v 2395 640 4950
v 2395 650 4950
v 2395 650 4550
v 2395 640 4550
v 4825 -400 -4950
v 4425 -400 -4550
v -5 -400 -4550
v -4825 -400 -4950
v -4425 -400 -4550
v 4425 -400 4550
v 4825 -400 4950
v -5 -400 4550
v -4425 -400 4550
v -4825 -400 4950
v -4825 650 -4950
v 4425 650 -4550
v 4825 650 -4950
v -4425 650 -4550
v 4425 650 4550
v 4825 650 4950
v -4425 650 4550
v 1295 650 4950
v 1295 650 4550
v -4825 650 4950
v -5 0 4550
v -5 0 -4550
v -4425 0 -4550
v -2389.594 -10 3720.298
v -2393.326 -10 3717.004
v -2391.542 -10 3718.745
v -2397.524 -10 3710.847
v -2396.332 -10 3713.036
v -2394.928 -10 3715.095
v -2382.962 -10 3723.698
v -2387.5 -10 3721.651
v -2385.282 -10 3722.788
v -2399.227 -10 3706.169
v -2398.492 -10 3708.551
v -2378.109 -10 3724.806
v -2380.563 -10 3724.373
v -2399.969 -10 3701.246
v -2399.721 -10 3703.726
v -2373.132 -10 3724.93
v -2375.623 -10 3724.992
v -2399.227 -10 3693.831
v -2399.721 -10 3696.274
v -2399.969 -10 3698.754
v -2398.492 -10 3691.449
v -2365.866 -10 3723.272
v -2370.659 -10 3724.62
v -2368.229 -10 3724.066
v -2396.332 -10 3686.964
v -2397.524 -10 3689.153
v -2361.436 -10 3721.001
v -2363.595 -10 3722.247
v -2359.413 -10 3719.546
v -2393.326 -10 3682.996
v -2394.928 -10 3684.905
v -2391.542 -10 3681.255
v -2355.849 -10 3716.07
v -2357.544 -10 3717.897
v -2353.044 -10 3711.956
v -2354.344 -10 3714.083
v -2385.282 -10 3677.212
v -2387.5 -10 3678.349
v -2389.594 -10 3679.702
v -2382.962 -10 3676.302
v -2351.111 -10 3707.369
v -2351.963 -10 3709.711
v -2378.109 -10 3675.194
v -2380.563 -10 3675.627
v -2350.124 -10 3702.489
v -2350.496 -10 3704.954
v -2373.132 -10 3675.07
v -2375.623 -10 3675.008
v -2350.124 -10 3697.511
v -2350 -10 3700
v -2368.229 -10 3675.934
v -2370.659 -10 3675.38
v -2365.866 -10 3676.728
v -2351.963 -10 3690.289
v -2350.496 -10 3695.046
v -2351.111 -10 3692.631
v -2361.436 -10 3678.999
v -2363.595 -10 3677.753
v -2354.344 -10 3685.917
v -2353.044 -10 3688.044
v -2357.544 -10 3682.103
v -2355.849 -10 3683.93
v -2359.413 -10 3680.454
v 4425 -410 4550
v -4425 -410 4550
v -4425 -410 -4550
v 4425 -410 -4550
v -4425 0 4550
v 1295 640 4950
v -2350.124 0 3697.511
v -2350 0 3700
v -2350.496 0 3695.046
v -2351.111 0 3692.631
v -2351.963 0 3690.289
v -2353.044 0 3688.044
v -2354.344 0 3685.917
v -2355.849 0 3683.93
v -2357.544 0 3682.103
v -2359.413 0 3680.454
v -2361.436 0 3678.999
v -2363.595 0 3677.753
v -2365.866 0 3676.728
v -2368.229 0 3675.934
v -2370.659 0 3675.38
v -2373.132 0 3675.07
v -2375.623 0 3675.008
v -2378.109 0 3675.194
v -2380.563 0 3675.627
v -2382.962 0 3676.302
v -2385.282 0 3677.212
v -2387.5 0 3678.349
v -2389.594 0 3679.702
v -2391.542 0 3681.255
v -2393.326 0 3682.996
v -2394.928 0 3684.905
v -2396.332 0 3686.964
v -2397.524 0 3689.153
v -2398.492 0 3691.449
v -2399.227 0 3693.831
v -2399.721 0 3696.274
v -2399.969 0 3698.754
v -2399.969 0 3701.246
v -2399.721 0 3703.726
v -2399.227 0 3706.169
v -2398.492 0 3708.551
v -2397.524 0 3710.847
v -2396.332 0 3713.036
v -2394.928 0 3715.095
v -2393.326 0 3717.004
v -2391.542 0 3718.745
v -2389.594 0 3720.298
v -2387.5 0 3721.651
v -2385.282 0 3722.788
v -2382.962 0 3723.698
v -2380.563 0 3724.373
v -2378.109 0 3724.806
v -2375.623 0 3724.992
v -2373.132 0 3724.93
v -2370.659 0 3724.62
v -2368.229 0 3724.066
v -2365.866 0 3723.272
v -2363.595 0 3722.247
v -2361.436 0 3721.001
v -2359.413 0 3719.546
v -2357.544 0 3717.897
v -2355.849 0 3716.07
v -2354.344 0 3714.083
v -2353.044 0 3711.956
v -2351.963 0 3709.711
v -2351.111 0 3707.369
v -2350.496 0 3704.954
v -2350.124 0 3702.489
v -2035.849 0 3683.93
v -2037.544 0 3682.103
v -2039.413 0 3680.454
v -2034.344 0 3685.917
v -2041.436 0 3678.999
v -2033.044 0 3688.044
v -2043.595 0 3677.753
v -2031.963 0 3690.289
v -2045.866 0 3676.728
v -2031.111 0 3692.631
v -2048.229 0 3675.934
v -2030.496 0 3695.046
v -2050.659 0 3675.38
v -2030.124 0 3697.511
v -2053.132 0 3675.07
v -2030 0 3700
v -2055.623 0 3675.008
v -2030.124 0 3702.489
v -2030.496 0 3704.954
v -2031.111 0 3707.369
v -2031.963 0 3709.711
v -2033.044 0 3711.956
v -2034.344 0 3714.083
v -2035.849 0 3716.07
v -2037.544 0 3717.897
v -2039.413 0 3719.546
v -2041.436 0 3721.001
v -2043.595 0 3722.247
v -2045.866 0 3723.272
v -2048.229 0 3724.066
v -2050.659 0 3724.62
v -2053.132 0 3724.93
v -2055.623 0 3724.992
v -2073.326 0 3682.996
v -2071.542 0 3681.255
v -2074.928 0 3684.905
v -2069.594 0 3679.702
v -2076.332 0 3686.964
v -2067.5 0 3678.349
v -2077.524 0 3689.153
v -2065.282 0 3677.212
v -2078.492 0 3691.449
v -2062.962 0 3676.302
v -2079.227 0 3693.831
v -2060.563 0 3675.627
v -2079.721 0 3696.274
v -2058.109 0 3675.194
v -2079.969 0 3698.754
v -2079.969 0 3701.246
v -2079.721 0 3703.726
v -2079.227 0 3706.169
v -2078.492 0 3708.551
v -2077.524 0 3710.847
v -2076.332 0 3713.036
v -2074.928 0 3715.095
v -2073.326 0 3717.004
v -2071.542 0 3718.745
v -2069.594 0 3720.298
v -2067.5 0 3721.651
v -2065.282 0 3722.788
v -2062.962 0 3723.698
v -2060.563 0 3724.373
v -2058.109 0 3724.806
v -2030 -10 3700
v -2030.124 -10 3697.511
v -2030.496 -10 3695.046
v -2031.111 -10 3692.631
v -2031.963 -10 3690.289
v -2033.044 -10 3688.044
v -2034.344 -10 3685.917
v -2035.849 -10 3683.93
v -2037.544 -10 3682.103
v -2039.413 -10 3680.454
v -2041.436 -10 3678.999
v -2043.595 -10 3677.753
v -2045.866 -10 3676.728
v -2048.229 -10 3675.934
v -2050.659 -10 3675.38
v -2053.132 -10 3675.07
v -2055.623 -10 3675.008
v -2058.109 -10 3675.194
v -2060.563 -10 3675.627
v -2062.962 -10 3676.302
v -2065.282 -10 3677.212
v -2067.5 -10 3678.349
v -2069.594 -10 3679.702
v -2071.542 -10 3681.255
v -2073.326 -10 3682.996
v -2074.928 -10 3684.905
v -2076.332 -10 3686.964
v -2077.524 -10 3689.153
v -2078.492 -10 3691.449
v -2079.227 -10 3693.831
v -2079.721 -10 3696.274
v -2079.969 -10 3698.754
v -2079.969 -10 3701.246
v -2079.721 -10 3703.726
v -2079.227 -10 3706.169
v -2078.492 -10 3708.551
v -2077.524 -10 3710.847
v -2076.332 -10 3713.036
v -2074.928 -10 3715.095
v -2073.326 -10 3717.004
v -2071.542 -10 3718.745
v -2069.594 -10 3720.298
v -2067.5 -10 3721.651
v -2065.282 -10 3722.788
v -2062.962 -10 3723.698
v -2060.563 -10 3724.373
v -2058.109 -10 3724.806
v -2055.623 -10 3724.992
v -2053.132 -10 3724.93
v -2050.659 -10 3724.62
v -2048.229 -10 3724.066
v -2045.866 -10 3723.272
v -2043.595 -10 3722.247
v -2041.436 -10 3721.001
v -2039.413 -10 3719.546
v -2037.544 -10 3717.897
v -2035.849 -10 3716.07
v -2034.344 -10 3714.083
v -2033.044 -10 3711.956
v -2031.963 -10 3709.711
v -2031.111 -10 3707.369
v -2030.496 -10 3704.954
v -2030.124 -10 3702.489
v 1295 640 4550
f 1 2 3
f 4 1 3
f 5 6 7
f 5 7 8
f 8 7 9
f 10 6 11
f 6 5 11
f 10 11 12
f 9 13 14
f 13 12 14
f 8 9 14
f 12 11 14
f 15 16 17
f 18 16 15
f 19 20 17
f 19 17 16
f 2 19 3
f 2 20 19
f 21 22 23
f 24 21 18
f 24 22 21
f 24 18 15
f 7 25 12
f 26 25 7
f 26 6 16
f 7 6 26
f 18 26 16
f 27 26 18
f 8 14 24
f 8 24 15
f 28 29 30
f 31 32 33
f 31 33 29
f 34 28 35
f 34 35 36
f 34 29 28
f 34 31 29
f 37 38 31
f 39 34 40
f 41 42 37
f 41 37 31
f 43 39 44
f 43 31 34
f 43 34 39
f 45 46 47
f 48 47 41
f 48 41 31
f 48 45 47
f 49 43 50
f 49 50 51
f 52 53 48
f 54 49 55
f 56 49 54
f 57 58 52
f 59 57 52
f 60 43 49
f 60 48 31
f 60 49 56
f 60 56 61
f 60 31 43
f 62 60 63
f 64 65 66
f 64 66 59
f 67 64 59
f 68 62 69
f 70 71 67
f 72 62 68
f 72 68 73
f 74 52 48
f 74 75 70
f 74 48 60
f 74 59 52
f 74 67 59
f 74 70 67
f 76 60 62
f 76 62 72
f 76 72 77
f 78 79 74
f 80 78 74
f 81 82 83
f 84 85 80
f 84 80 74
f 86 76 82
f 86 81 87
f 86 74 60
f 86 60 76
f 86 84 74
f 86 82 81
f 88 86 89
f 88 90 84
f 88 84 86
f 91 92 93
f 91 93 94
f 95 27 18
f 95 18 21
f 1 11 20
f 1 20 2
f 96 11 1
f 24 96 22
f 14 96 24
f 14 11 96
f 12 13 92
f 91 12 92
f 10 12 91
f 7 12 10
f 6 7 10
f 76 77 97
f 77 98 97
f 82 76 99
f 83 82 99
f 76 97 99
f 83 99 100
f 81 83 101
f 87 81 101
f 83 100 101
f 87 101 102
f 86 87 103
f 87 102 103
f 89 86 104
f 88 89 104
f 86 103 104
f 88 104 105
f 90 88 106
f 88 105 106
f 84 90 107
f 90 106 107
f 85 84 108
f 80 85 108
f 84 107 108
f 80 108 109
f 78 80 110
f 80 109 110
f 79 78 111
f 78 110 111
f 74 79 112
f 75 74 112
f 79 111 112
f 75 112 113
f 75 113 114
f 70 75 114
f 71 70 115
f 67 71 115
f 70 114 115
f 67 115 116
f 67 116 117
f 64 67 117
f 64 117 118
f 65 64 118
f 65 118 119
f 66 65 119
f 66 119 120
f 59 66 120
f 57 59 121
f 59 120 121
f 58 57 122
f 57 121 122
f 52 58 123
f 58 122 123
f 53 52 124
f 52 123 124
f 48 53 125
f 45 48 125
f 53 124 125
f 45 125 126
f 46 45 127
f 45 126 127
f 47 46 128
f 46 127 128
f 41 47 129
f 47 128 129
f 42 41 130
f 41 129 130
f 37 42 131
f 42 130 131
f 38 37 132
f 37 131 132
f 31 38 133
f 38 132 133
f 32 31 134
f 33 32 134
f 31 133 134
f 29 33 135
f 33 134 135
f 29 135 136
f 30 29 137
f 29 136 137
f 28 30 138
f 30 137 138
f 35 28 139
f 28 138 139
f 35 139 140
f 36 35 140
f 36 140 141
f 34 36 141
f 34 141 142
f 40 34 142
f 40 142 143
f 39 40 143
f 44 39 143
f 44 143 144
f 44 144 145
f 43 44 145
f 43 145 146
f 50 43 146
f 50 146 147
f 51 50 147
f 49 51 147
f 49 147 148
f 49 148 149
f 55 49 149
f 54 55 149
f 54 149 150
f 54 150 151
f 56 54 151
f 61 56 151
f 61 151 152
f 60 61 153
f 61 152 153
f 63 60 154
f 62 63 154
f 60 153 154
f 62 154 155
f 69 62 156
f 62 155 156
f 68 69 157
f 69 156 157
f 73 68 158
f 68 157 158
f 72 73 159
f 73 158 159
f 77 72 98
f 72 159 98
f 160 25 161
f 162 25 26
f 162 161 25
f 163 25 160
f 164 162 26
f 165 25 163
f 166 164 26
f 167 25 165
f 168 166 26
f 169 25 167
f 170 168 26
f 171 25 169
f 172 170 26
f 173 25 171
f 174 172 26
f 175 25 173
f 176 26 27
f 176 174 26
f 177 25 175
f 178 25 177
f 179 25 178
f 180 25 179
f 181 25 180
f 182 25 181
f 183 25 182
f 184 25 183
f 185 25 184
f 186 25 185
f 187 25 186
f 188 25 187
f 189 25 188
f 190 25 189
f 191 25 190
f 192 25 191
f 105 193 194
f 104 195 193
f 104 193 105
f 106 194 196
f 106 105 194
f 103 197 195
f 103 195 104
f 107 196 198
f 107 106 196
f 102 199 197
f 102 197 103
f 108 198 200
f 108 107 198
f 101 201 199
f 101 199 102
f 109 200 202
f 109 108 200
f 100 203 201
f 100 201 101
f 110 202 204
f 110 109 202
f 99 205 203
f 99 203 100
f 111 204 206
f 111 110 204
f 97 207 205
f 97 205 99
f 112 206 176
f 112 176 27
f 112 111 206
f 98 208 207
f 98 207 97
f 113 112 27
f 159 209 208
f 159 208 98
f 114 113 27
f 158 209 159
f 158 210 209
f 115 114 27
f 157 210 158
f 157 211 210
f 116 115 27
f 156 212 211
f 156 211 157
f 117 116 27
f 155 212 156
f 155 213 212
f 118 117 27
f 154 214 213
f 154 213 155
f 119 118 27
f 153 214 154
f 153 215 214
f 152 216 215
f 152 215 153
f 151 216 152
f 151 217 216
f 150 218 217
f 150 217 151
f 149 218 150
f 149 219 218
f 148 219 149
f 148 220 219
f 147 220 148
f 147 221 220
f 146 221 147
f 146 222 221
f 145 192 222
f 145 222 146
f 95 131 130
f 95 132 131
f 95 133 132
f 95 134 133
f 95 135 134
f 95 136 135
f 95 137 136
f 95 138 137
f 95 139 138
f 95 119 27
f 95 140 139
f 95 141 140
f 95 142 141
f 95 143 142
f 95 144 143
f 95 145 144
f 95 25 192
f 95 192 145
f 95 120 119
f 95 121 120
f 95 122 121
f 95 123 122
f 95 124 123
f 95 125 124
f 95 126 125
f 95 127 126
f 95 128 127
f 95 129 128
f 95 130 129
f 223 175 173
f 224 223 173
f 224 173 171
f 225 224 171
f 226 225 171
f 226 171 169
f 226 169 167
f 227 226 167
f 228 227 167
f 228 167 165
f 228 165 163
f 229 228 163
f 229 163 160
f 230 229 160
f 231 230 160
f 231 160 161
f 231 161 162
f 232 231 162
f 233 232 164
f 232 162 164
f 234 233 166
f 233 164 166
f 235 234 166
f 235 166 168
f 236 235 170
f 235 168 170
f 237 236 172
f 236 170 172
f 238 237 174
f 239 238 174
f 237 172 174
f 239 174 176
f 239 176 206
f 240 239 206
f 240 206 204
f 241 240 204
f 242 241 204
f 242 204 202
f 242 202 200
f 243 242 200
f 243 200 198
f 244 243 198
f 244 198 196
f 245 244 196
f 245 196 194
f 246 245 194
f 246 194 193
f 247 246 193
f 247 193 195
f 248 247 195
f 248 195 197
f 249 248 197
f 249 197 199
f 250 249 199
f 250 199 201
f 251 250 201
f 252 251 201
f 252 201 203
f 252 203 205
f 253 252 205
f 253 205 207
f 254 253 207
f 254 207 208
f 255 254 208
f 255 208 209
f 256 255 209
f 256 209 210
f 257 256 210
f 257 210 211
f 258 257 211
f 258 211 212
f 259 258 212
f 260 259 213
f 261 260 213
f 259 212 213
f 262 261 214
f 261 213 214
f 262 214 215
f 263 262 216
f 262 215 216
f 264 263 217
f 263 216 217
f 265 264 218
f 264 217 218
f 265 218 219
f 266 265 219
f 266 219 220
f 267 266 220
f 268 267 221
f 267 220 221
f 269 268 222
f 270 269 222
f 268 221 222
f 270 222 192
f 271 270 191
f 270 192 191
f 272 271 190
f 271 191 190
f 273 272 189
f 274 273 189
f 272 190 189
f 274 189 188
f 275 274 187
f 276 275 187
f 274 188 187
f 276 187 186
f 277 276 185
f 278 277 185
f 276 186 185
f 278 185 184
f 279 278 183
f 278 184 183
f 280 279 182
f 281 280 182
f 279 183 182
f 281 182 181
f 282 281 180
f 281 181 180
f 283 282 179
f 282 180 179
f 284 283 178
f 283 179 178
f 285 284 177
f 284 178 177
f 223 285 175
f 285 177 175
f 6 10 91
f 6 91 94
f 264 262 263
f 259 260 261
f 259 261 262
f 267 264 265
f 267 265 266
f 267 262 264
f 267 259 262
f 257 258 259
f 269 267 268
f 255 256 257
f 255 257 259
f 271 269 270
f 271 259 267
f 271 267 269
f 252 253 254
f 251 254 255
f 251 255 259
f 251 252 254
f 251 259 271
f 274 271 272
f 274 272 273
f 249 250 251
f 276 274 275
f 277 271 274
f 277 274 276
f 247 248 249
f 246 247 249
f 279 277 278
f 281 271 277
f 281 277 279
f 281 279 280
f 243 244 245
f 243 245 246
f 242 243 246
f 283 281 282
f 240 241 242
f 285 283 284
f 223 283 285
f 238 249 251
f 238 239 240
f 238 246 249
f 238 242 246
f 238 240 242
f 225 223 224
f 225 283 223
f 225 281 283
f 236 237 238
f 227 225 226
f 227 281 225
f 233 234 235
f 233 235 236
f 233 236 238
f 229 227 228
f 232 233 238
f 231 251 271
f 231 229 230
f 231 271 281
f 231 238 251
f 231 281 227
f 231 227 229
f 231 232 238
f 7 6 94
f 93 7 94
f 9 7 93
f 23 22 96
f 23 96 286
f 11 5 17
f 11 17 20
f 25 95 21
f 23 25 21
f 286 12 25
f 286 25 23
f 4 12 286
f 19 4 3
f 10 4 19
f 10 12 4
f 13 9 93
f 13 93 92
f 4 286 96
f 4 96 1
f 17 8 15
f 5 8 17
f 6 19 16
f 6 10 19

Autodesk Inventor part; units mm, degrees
ref_plane "YZ Plane" through (0, 0, 0) normal (1, 0, 0) x (0, 1, 0)
ref_plane "XZ Plane" through (0, 0, 0) normal (0, 1, 0) x (-1, 0, 0)
ref_plane "XY Plane" through (0, 0, 0) normal (0, 0, 1) x (1, 0, 0)
sketch "Sketch1" plane through (0, 0, 0) normal (0, 1, 0) x (-1, 0, 0)
  line L0 (15.7014, 4425) -> (-15.7014, 4425)
  line L1 (4425, 4550) -> (-4425, 4550)
  line L2 (-4425, 4550) -> (-4425, -4550)
  line L3 (-4425, -4550) -> (4425, -4550)
  line L4 (4425, -4550) -> (4425, 4550)
  line L5 (4425, 4550) -> (-4425, -4550) construction
  line L6 (-4425, 4550) -> (4425, -4550) construction
  line L7 (-4825, 4950) -> (4825, 4950)
  line L8 (4825, 4950) -> (4825, -4950)
  line L9 (4825, -4950) -> (-4825, -4950)
  line L10 (-4825, -4950) -> (-4825, 4950)
  point P0 (0, 0)
  point P1 (0, 0)
  dimension "d0" = 8850
  dimension "d1" = 9100
  dimension "d3" = 400
extrude "Extrusion1" add sketch "Sketch1" along normal blind 650 and the other way blind 400
sketch "Sketch4" plane through (0, -400, 0) normal (0, -1, 0) x (1, 0, 0)
  line L0 (-4825, -4950) -> (4825, -4950)
  line L1 (4825, -4950) -> (4825, 4950)
  line L2 (4825, 4950) -> (-4825, 4950)
  line L3 (-4825, 4950) -> (-4825, -4950)
  line L4 (-4425, -4550) -> (-4425, 4550)
  line L5 (-4425, 4550) -> (4425, 4550)
  line L6 (4425, 4550) -> (4425, -4550)
  line L7 (4425, -4550) -> (-4425, -4550)
  point P0 (0, 0)
extrude "Extrusion3" add sketch "Sketch4" along normal blind 10 contours L4 L5 L6 L7
sketch "Sketch5" plane through (0, 0, 0) normal (0, 1, 0) x (-1, 0, 0)
  line L0 (-4825, -4950) -> (4825, -4950)
  line L1 (4825, -4950) -> (4825, 4950)
  line L2 (4825, 4950) -> (-4825, 4950)
  line L3 (-4825, 4950) -> (-4825, -4950)
  line L4 (4425, 4550) -> (4425, -4550)
  line L5 (4425, -4550) -> (-4425, -4550)
  line L6 (-4425, -4550) -> (-4425, 4550)
  line L7 (-4425, 4550) -> (4425, 4550)
  line L8 (5, 4550) -> (5, -4550)
  point P0 (0, 0)
  dimension "d21" = 4420
extrude "Extrusion4" add sketch "Sketch5" against normal up to surface (400 mm away) contours L4 L5 L8 L7
sketch "Sketch6" plane through (0, 650, 0) normal (0, 1, 0) x (1, 0, 0)
  line L0 (4825, 4950) -> (-4825, 4950)
  line L1 (-4825, 4950) -> (-4825, -4950)
  line L2 (-4825, -4950) -> (4825, -4950)
  line L3 (4825, -4950) -> (4825, 4950)
  line L4 (-4425, -4550) -> (-4425, 4550)
  line L5 (-4425, 4550) -> (4425, 4550)
  line L6 (4425, 4550) -> (4425, -4550)
  line L7 (4425, -4550) -> (-4425, -4550)
  line L8 (1295, -4950) -> (1295, -4550)
  line L9 (2395, -4950) -> (2395, -4550)
  line L10 (-5, -4550) -> (-5, 4550)
  point P0 (0, 0)
  dimension "d24" = 1100
  dimension "d25" = 1300
extrude "Extrusion5" cut sketch "Sketch6" against normal blind 10 contours L2 L8 L7 L9
sketch "Sketch7" plane through (1295, 650, 4950) normal (1, 0, 0) x (0, 0, -1)
  line L0 (0, -1050) -> (0, 0)
  line L1 (9900, 0) -> (0, 0)
  line L2 (9900, -1050) -> (9900, 0)
  line L3 (0, -1050) -> (9900, -1050)
  line L4 (9500, -1050) -> (400, -1050)
  line L5 (9500, -650) -> (9500, -1050)
  line L6 (400, -650) -> (9500, -650)
  line L7 (400, -1050) -> (400, -650)
  line L8 (400, 0) -> (400, -650)
  line L9 (400, 0) -> (1200, -150)
  line L10 (1200, -150) -> (1200, -650)
  line L11 (1200, -150) -> (2700, -150)
  line L12 (2700, -150) -> (2700, -650)
  point P0 (4950, -650)
  point P1 (400, -1050)
  dimension "d42" = 10.62
  dimension "d43" = 1500
  dimension "d48" = 800
  dimension "d55" = 900
extrude "Extrusion6" [suppressed]
sketch "Sketch8" plane through (0, 0, 0) normal (0, 1, 0) x (1, 0, 0)
  circle A0 centre (-2375, -3700) radius 25
  circle A1 centre (-2055, -3700) radius 25
  line L0 (-4425, -4550) -> (-4425, 4550)
  line L1 (1295, -4550) -> (-4425, -4550)
  point P0 (0, 0)
  dimension "d32" = 50
  dimension "d33" = 2050
  dimension "d34" = 850
  dimension "d35" = 2370
extrude "Extrusion7" cut sketch "Sketch8" against normal blind 10
sketch "Sketch12" plane through (1295, 0, 2250) normal (0, 0, -1) x (-1, 0, 0)
  line L0 (0, 500) -> (-1100, 500)
  line L1 (3645, 0) -> (3695, 0)
  line L2 (3325, 0) -> (3375, 0)
  line L3 (1300, 0) -> (5720, 0)
  line L4 (5720, 0) -> (1300, 0)
  line L5 (1300, 0) -> (5720, 0)
  line L6 (2850, 0) -> (2850, 200)
  line L7 (2850, 200) -> (0, 200)
  line L8 (0, 200) -> (0, 500)
  line L9 (-1100, 500) -> (-1100, 0)
  line L10 (-1100, 0) -> (2850, 0)
  line L11 (0, 500) -> (1350, 200)
  point P0 (1295, 0)
  point P1 (1300, 0)
  dimension "d49" = 200
  dimension "d50" = 12.529
  dimension "d51" = 1350
  dimension "d54" = 1500
extrude "Extrusion10" [suppressed]
properties part number "BSH 0 foudation"
